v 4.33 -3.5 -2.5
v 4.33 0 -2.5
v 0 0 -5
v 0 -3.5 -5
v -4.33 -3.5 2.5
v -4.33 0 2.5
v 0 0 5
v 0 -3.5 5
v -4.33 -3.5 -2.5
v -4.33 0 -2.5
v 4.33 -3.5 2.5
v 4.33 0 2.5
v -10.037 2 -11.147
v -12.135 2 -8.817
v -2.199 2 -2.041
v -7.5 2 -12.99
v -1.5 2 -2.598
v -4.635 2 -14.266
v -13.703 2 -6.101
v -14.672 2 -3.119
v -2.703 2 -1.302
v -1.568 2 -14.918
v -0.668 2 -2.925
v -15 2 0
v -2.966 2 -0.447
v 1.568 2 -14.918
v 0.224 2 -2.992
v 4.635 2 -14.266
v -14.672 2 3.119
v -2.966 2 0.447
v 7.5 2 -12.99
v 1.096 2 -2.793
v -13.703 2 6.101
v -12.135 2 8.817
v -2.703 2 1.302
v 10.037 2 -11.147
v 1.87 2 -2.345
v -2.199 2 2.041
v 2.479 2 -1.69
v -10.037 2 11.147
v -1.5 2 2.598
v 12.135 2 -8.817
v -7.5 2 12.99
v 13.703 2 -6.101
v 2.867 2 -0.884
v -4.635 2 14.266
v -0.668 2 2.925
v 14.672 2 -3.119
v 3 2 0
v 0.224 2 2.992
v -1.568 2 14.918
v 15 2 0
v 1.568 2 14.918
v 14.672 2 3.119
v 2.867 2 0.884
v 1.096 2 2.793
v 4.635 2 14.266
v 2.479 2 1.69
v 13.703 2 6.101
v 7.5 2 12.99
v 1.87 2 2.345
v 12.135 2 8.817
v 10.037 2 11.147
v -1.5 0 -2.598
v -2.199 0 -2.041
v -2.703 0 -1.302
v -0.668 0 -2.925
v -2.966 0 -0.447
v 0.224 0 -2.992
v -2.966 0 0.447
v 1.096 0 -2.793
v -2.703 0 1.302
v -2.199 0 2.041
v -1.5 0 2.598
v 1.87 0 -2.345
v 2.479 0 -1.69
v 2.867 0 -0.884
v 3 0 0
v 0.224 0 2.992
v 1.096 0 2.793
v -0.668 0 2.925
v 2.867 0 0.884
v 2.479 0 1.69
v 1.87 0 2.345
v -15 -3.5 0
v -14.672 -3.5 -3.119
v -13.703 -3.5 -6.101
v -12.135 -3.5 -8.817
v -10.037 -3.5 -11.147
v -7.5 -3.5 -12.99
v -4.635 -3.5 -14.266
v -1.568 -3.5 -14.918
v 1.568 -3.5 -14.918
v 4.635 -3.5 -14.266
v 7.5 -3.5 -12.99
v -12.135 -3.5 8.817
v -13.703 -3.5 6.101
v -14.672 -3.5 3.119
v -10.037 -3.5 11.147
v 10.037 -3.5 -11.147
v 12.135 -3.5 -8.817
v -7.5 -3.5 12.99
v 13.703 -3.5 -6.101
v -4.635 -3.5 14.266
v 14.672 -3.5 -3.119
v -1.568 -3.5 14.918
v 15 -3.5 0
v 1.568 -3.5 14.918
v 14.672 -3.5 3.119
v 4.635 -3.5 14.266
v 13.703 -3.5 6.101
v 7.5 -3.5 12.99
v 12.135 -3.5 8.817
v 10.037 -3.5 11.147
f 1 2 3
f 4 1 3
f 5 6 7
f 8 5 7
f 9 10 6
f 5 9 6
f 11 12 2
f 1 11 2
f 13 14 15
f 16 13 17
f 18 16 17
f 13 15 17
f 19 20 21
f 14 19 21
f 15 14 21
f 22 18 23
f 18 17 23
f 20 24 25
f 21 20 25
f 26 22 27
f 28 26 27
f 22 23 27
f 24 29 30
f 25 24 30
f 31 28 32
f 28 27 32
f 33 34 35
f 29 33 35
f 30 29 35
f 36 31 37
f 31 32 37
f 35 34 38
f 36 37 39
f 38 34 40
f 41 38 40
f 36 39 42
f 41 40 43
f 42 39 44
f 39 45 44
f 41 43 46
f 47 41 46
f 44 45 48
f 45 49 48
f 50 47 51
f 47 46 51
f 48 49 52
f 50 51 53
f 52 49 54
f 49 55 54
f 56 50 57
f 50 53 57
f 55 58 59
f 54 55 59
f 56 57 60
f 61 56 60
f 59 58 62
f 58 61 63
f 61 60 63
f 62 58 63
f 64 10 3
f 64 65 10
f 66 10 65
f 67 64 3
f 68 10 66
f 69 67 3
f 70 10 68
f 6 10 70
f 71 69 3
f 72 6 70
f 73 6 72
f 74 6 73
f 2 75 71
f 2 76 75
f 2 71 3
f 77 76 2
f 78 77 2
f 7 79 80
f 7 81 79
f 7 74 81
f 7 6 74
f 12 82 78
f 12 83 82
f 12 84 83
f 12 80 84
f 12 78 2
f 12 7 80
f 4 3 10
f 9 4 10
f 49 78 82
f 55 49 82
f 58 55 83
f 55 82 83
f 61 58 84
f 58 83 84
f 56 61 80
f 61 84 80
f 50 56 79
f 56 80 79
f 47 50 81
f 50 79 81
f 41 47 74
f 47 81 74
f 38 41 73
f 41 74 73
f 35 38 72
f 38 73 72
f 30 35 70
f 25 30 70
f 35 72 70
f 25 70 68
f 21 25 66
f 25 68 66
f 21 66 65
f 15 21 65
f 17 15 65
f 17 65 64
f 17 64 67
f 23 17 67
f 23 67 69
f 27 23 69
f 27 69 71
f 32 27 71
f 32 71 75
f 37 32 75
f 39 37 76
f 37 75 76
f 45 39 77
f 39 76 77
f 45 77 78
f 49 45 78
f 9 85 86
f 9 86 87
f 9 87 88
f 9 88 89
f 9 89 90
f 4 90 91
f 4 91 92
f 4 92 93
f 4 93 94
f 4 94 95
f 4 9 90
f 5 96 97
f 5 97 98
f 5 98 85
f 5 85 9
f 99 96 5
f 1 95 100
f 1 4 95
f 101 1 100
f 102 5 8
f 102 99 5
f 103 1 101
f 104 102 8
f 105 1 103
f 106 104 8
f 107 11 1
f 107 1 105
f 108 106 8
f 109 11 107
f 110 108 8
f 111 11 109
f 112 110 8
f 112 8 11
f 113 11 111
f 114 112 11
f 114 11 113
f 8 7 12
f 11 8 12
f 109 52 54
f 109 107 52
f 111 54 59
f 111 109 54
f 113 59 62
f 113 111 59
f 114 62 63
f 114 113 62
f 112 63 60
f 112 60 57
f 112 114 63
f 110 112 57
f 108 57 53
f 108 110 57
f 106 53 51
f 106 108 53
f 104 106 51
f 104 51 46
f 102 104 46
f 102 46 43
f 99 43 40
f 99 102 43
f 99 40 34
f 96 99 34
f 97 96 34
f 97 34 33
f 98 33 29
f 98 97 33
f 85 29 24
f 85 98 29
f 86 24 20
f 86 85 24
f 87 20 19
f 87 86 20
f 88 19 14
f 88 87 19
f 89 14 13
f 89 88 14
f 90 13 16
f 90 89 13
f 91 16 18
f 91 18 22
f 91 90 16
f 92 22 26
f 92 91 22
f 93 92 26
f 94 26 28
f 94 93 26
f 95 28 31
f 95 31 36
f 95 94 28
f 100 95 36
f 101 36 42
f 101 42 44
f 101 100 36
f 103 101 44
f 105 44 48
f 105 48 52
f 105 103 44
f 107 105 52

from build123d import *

# Parameters (mm, degrees)
F0_R     = 15
F1_DEPTH = 3.5
F0_R_2   = 3
F2_DEPTH = 2


with BuildPart() as f1:
    # F0 (on Front) → F1 (new body)
    with BuildSketch(Plane.XZ):
        Circle(F0_R)
        Polygon((-4.330127, 2.5), (0, 5), (4.330127, 2.5), (4.330127, -2.5), (0, -5), (-4.330127, -2.5), align=None, mode=Mode.SUBTRACT)
    extrude(amount=F1_DEPTH)

    # F0 (on Front) → F2 (join)
    with BuildSketch(Plane.XZ):
        Circle(F0_R)
        Polygon((-4.330127, 2.5), (0, 5), (4.330127, 2.5), (4.330127, -2.5), (0, -5), (-4.330127, -2.5), align=None, mode=Mode.SUBTRACT)
        Polygon((4.330127, 2.5), (0, 5), (-4.330127, 2.5), (-4.330127, -2.5), (0, -5), (4.330127, -2.5), align=None)
        Circle(F0_R_2, mode=Mode.SUBTRACT)
    extrude(amount=-F2_DEPTH)


solid = f1.part
